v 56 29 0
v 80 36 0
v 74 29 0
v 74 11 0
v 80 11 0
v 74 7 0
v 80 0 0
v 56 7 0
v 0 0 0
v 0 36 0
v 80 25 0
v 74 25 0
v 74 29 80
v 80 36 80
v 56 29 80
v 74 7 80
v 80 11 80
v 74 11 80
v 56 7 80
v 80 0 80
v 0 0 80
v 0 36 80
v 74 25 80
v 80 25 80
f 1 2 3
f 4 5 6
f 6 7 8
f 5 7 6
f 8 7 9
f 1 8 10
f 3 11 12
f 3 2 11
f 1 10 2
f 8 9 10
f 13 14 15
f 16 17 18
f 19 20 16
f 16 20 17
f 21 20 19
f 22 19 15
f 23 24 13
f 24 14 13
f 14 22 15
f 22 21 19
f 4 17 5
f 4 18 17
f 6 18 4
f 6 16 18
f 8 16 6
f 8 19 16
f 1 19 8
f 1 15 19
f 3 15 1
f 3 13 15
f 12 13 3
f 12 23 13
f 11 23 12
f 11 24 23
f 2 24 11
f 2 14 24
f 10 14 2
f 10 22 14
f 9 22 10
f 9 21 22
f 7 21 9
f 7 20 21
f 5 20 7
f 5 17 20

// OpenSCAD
$fn = 32;

// ----------------------------------------------------------------------
// T-slot rail: 80 x 36 mm section, 80 mm long
// ----------------------------------------------------------------------

// --- parameters (mm) ---
profile_height = 80;      // extrusion height
profile_points = 12;      // points of the closed outline

profile = [[0, 0], [80, 0], [80, 11], [74, 11], [74, 7], [56, 7], [56, 29], [74, 29], [74, 25], [80, 25], [80, 36], [0, 36]];  // single closed polygon, 12 points, counter clockwise

// --- the one profile operation ---
linear_extrude(height = profile_height) polygon(points = profile);
